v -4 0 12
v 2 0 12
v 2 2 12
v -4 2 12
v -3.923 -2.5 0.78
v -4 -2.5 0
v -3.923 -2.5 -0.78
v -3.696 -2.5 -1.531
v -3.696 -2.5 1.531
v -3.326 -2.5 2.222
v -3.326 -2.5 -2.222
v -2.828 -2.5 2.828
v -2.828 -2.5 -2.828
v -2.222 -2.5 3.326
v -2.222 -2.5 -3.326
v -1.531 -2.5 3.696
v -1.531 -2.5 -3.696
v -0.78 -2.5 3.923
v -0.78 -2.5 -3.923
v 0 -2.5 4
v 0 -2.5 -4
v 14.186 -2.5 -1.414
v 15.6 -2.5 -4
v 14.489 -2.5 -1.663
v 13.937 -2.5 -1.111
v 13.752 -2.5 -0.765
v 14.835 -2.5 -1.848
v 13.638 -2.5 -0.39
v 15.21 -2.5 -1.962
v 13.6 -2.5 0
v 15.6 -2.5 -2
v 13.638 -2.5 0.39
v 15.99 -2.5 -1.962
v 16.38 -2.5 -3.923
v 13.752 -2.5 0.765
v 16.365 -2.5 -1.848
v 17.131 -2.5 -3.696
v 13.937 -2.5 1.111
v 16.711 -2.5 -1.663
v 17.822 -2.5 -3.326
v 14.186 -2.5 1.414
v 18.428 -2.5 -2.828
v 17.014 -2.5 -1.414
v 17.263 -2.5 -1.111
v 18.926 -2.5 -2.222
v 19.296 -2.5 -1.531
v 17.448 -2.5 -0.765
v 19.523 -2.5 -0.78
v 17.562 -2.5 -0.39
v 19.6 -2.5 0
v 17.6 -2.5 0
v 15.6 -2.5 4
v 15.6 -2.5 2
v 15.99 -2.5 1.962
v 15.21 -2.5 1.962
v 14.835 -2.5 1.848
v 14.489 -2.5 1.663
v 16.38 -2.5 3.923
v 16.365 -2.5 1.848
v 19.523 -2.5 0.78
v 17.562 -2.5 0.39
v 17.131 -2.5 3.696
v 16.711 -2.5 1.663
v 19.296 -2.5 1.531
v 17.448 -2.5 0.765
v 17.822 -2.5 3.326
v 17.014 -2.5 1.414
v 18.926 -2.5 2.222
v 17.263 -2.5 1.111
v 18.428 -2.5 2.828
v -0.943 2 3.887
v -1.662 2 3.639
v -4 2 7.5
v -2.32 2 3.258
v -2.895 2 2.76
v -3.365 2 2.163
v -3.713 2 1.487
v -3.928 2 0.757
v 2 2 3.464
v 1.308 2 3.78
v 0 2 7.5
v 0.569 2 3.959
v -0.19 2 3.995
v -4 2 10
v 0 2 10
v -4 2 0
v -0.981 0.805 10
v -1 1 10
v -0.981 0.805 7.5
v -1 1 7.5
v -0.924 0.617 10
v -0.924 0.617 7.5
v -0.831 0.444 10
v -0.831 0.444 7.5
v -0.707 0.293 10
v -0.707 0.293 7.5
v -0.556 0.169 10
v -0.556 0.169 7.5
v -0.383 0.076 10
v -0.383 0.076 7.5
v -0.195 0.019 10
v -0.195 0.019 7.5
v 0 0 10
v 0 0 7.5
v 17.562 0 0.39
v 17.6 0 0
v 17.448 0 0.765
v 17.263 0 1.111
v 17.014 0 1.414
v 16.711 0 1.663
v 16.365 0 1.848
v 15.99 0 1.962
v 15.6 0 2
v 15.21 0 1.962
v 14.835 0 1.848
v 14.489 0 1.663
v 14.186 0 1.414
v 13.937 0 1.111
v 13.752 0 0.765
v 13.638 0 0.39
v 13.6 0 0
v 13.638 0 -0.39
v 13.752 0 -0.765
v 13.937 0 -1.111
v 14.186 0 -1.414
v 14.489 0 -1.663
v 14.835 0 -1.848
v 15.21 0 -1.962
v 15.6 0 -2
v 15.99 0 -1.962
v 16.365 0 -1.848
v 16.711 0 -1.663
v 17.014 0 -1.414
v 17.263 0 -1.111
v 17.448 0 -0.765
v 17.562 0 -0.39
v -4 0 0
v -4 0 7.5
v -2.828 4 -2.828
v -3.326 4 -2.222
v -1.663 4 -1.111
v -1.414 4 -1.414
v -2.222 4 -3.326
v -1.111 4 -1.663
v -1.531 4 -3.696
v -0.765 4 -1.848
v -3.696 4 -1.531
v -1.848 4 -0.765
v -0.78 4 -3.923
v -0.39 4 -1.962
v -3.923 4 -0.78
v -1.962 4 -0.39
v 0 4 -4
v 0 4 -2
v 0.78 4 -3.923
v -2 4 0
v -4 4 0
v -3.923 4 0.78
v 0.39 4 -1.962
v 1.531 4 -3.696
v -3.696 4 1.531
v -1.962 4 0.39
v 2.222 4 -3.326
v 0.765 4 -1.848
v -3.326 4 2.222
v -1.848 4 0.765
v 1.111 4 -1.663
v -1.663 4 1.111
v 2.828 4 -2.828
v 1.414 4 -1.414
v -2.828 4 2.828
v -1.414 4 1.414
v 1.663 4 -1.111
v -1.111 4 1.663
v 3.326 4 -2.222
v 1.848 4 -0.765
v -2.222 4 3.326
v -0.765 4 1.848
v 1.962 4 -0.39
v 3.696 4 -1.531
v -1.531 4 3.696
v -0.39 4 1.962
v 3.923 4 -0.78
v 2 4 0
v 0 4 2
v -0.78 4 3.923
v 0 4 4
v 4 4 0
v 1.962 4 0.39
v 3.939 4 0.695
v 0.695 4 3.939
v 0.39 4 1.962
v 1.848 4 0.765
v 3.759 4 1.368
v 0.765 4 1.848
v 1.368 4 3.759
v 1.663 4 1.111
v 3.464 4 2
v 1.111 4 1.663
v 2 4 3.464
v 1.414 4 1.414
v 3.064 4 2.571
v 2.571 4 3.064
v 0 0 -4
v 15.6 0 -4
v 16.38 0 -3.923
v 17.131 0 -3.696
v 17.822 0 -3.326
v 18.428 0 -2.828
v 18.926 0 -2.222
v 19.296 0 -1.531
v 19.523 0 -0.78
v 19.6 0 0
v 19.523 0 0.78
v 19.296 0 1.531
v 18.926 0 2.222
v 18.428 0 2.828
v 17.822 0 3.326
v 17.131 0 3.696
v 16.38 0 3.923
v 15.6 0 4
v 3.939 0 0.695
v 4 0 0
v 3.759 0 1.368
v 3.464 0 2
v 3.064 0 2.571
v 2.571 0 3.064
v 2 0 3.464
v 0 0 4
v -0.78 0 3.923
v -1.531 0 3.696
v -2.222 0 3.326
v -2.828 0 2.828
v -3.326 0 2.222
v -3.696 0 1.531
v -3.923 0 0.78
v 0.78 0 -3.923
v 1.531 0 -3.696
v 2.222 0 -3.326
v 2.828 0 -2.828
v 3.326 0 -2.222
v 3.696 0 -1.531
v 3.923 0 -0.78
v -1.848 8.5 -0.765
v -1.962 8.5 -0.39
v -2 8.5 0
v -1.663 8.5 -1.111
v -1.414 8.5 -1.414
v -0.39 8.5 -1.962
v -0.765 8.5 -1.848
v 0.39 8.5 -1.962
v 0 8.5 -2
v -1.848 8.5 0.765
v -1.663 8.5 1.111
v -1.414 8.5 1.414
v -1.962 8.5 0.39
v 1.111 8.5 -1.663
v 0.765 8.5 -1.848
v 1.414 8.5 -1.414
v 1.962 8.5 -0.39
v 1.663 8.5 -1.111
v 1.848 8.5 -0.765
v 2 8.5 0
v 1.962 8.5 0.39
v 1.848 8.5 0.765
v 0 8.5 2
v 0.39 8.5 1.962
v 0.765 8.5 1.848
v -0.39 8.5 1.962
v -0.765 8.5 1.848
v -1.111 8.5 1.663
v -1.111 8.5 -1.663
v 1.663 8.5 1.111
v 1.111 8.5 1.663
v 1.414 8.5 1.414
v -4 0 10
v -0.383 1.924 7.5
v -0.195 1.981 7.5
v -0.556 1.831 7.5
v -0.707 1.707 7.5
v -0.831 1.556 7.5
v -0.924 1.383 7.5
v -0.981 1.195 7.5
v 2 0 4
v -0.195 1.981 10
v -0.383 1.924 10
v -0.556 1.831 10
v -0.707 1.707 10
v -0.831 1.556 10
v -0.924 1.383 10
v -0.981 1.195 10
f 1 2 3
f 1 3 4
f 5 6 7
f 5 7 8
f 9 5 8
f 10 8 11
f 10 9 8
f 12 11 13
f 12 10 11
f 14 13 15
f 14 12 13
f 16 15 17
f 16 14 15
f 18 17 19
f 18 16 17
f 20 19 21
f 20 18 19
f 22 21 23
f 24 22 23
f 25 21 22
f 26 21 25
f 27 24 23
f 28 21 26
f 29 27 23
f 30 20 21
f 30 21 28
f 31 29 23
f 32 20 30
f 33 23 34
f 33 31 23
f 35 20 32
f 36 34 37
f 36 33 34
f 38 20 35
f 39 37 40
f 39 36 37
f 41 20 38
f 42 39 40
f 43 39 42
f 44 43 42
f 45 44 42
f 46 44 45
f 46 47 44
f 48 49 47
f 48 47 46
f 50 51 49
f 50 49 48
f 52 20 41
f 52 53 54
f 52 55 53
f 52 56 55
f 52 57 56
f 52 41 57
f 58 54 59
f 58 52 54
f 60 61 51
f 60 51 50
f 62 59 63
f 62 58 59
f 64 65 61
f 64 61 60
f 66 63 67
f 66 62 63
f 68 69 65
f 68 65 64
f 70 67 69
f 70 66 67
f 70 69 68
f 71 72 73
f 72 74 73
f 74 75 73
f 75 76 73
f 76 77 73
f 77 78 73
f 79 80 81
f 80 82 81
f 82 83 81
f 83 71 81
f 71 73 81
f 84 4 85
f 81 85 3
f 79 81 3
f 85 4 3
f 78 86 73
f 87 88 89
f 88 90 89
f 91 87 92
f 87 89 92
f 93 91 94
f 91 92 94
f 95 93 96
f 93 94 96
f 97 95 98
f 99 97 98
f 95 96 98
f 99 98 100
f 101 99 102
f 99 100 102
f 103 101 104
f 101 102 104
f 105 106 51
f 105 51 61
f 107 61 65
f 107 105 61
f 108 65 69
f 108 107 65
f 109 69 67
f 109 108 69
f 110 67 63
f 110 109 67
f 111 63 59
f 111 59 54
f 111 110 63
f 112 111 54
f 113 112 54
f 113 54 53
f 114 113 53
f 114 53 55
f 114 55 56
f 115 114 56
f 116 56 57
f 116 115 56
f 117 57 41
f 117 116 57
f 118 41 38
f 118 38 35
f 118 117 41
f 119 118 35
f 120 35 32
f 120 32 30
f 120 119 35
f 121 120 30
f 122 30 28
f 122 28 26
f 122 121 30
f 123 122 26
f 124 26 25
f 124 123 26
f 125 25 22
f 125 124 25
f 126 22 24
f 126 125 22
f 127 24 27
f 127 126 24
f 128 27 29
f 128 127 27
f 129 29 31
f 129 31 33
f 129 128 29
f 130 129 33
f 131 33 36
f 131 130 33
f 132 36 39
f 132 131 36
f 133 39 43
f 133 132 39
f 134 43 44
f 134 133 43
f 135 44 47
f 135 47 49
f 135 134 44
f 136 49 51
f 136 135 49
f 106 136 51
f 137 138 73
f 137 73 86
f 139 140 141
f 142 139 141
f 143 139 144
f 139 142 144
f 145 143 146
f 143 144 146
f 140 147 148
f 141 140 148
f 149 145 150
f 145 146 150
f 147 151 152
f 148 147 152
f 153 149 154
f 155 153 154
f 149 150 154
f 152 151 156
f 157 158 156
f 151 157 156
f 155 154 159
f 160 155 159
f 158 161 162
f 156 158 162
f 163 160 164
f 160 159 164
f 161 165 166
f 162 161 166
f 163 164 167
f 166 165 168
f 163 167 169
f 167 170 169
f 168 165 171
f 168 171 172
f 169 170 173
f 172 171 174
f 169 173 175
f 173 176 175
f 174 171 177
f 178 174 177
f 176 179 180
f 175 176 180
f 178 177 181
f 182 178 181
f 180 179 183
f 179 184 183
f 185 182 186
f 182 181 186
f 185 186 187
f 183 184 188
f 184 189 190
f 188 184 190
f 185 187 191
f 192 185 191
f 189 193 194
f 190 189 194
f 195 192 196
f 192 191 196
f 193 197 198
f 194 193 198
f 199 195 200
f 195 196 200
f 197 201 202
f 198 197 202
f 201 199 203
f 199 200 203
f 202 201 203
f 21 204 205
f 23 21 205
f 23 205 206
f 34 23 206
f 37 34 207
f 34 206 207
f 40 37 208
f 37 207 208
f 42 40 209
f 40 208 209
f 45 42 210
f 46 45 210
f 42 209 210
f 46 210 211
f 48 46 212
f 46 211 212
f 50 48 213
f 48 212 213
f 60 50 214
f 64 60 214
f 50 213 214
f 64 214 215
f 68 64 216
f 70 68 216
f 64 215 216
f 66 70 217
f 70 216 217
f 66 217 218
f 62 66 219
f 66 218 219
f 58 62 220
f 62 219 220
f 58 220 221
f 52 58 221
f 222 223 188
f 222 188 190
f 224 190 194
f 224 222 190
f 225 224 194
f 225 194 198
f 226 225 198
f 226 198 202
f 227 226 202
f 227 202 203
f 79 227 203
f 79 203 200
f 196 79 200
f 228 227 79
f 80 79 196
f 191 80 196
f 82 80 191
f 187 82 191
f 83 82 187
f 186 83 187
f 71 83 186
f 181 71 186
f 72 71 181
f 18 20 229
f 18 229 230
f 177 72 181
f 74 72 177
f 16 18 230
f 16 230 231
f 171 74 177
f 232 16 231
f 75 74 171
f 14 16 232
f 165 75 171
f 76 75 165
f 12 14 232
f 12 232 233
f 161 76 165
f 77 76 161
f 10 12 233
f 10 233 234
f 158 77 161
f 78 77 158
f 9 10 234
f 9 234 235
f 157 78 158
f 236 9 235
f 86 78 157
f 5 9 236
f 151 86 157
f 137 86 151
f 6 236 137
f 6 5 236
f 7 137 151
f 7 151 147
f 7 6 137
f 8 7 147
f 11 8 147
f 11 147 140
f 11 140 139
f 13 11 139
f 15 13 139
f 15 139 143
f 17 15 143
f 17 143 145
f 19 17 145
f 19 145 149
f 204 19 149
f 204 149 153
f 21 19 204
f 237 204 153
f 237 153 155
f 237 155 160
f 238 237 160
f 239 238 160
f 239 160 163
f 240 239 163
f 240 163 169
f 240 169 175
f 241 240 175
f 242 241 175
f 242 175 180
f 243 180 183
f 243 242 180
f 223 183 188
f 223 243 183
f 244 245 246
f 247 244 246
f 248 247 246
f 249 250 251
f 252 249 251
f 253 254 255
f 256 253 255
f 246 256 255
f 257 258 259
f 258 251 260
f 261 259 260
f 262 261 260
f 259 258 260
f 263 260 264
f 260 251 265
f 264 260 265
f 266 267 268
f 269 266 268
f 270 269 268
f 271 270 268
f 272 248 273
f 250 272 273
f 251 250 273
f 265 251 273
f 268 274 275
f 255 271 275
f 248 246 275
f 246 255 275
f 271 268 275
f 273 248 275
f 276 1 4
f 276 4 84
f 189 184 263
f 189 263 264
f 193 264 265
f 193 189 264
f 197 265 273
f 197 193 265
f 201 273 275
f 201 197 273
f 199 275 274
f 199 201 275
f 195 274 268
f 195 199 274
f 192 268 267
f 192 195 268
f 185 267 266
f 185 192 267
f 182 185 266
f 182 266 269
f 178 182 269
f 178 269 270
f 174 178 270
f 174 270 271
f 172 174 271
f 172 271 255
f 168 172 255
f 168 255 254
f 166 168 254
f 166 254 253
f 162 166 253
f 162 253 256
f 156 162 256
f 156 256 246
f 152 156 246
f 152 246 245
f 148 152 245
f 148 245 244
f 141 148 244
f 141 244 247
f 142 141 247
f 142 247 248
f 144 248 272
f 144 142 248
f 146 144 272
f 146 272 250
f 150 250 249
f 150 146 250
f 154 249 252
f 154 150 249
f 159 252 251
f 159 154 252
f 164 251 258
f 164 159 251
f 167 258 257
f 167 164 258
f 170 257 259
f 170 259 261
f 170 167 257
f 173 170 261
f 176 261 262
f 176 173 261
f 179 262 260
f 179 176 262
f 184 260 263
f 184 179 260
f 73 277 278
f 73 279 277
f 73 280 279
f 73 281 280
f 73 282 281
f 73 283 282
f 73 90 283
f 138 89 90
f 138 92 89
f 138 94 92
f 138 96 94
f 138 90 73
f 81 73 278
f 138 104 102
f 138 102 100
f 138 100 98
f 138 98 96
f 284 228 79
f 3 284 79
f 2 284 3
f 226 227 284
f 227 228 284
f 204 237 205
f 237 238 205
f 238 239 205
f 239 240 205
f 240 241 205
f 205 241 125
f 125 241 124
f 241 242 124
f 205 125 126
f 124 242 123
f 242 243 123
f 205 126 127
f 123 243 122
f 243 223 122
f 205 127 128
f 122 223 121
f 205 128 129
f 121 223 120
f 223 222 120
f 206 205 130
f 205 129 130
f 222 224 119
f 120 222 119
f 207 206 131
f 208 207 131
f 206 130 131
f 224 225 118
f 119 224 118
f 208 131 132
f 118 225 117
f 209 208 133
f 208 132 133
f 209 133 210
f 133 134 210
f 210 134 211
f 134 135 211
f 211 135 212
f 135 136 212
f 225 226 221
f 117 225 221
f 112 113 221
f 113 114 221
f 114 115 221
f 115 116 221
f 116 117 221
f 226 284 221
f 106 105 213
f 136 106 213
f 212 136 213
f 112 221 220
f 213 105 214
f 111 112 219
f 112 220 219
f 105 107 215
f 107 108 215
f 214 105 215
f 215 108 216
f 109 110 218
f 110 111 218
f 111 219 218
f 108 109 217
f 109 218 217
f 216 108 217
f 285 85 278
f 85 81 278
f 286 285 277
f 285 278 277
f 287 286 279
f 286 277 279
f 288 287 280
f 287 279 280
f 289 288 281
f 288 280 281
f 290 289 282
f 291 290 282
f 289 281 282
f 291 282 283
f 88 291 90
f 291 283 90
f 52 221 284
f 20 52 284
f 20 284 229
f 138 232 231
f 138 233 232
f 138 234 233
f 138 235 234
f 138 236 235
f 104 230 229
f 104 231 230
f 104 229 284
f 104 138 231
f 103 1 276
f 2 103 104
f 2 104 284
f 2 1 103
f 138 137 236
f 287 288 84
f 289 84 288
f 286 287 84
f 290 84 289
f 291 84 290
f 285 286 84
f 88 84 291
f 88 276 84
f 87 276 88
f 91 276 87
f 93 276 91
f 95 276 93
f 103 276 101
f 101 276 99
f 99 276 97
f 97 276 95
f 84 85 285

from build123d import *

# Parameters (mm, degrees)
F0_R     = 2
F1_DEPTH = 2.5
F2_DEPTH = 4
F3_DEPTH = 8.5
F4_DEPTH = 2
F5_R     = 0.99999


# Not quite as in the source:
# - a fillet or chamfer is up to 0.001 mm smaller than in the source, because OpenCascade refuses the exact size


with BuildPart() as f1:
    # F0 (on Front) → F1 (new body)
    with BuildSketch(Plane.XZ):
        with BuildLine():
            Line((2, 3.4641016151), (2, 0))
            ThreePointArc((2, 0), (0, -2), (-2, 0))
            Line((-2, 0), (-4, 0))
            ThreePointArc((-4, 0), (-2.8284271247, -2.8284271247), (0, -4))
            ThreePointArc((0, -4), (2.8284271247, -2.8284271247), (4, 0))
            ThreePointArc((4, 0), (3.4641016151, 2), (2, 3.4641016151))
        make_face()
        with BuildLine():
            ThreePointArc((0, 4), (1.0352761804, 3.8637033052), (2, 3.4641016151))
            Line((2, 3.4641016151), (2, 4))
            Line((2, 4), (0, 4))
        make_face()
        with BuildLine():
            Line((2, 4), (2, 3.4641016151))
            ThreePointArc((2, 3.4641016151), (3.4641016151, 2), (4, 0))
            ThreePointArc((4, 0), (2.8284271247, -2.8284271247), (0, -4))
            Line((0, -4), (15.6, -4))
            ThreePointArc((15.6, -4), (19.6, 0), (15.6, 4))
            Line((15.6, 4), (2, 4))
        make_face()
        with Locations((15.6, 0)):
            Circle(F0_R, mode=Mode.SUBTRACT)
        with BuildLine():
            ThreePointArc((-2, 0), (0, 2), (2, 0))
            Line((2, 0), (2, 3.4641016151))
            ThreePointArc((2, 3.4641016151), (1.0352761804, 3.8637033052), (0, 4))
            ThreePointArc((0, 4), (-2.8284271247, 2.8284271247), (-4, 0))
            Line((-4, 0), (-2, 0))
        make_face()
        with BuildLine():
            ThreePointArc((-2, 0), (0, -2), (2, 0))
            Line((2, 0), (-2, 0))
        make_face()
        with BuildLine():
            Line((-2, 0), (2, 0))
            ThreePointArc((2, 0), (0, 2), (-2, 0))
        make_face()
    extrude(amount=F1_DEPTH)

    # F0 (on Front) → F2 (join)
    with BuildSketch(Plane.XZ):
        with BuildLine():
            ThreePointArc((-2, 0), (0, 2), (2, 0))
            Line((2, 0), (2, 3.4641016151))
            ThreePointArc((2, 3.4641016151), (1.0352761804, 3.8637033052), (0, 4))
            ThreePointArc((0, 4), (-2.8284271247, 2.8284271247), (-4, 0))
            Line((-4, 0), (-2, 0))
        make_face()
        with BuildLine():
            Line((2, 3.4641016151), (2, 0))
            ThreePointArc((2, 0), (0, -2), (-2, 0))
            Line((-2, 0), (-4, 0))
            ThreePointArc((-4, 0), (-2.8284271247, -2.8284271247), (0, -4))
            ThreePointArc((0, -4), (2.8284271247, -2.8284271247), (4, 0))
            ThreePointArc((4, 0), (3.4641016151, 2), (2, 3.4641016151))
        make_face()
    extrude(amount=-F2_DEPTH)

    # F0 (on Front) → F3 (join)
    with BuildSketch(Plane.XZ):
        with BuildLine():
            ThreePointArc((-2, 0), (0, -2), (2, 0))
            Line((2, 0), (-2, 0))
        make_face()
        with BuildLine():
            Line((-2, 0), (2, 0))
            ThreePointArc((2, 0), (0, 2), (-2, 0))
        make_face()
    extrude(amount=-F3_DEPTH)

    # F0 (on Front) → F4 (join)
    with BuildSketch(Plane.XZ):
        with BuildLine():
            Line((-4, 7.5), (-4, 0))
            ThreePointArc((-4, 0), (-2.8284271247, 2.8284271247), (0, 4))
            Line((0, 4), (2, 4))
            Line((2, 4), (2, 12))
            Line((2, 12), (-4, 12))
            Line((-4, 12), (-4, 10))
            Line((-4, 10), (-1, 10))
            Line((-1, 10), (-1, 7.5))
            Line((-1, 7.5), (-4, 7.5))
        make_face()
        with BuildLine():
            ThreePointArc((0, 4), (1.0352761804, 3.8637033052), (2, 3.4641016151))
            Line((2, 3.4641016151), (2, 4))
            Line((2, 4), (0, 4))
        make_face()
        with BuildLine():
            ThreePointArc((-2, 0), (0, 2), (2, 0))
            Line((2, 0), (2, 3.4641016151))
            ThreePointArc((2, 3.4641016151), (1.0352761804, 3.8637033052), (0, 4))
            ThreePointArc((0, 4), (-2.8284271247, 2.8284271247), (-4, 0))
            Line((-4, 0), (-2, 0))
        make_face()
        with BuildLine():
            ThreePointArc((-2, 0), (0, -2), (2, 0))
            Line((2, 0), (-2, 0))
        make_face()
        with BuildLine():
            Line((-2, 0), (2, 0))
            ThreePointArc((2, 0), (0, 2), (-2, 0))
        make_face()
        with BuildLine():
            Line((2, 3.4641016151), (2, 0))
            ThreePointArc((2, 0), (0, -2), (-2, 0))
            Line((-2, 0), (-4, 0))
            ThreePointArc((-4, 0), (-2.8284271247, -2.8284271247), (0, -4))
            ThreePointArc((0, -4), (2.8284271247, -2.8284271247), (4, 0))
            ThreePointArc((4, 0), (3.4641016151, 2), (2, 3.4641016151))
        make_face()
    extrude(amount=-F4_DEPTH)

    # F5 (radius 1 in the source; OpenCascade refuses exactly that, so slightly less here)
    f5_edges = [f1.edges().sort_by_distance(p)[0] for p in [
        (-1, 0, 8.75),
        (-1, 2, 8.75),
    ]]
    fillet(f5_edges, radius=F5_R)


solid = f1.part
